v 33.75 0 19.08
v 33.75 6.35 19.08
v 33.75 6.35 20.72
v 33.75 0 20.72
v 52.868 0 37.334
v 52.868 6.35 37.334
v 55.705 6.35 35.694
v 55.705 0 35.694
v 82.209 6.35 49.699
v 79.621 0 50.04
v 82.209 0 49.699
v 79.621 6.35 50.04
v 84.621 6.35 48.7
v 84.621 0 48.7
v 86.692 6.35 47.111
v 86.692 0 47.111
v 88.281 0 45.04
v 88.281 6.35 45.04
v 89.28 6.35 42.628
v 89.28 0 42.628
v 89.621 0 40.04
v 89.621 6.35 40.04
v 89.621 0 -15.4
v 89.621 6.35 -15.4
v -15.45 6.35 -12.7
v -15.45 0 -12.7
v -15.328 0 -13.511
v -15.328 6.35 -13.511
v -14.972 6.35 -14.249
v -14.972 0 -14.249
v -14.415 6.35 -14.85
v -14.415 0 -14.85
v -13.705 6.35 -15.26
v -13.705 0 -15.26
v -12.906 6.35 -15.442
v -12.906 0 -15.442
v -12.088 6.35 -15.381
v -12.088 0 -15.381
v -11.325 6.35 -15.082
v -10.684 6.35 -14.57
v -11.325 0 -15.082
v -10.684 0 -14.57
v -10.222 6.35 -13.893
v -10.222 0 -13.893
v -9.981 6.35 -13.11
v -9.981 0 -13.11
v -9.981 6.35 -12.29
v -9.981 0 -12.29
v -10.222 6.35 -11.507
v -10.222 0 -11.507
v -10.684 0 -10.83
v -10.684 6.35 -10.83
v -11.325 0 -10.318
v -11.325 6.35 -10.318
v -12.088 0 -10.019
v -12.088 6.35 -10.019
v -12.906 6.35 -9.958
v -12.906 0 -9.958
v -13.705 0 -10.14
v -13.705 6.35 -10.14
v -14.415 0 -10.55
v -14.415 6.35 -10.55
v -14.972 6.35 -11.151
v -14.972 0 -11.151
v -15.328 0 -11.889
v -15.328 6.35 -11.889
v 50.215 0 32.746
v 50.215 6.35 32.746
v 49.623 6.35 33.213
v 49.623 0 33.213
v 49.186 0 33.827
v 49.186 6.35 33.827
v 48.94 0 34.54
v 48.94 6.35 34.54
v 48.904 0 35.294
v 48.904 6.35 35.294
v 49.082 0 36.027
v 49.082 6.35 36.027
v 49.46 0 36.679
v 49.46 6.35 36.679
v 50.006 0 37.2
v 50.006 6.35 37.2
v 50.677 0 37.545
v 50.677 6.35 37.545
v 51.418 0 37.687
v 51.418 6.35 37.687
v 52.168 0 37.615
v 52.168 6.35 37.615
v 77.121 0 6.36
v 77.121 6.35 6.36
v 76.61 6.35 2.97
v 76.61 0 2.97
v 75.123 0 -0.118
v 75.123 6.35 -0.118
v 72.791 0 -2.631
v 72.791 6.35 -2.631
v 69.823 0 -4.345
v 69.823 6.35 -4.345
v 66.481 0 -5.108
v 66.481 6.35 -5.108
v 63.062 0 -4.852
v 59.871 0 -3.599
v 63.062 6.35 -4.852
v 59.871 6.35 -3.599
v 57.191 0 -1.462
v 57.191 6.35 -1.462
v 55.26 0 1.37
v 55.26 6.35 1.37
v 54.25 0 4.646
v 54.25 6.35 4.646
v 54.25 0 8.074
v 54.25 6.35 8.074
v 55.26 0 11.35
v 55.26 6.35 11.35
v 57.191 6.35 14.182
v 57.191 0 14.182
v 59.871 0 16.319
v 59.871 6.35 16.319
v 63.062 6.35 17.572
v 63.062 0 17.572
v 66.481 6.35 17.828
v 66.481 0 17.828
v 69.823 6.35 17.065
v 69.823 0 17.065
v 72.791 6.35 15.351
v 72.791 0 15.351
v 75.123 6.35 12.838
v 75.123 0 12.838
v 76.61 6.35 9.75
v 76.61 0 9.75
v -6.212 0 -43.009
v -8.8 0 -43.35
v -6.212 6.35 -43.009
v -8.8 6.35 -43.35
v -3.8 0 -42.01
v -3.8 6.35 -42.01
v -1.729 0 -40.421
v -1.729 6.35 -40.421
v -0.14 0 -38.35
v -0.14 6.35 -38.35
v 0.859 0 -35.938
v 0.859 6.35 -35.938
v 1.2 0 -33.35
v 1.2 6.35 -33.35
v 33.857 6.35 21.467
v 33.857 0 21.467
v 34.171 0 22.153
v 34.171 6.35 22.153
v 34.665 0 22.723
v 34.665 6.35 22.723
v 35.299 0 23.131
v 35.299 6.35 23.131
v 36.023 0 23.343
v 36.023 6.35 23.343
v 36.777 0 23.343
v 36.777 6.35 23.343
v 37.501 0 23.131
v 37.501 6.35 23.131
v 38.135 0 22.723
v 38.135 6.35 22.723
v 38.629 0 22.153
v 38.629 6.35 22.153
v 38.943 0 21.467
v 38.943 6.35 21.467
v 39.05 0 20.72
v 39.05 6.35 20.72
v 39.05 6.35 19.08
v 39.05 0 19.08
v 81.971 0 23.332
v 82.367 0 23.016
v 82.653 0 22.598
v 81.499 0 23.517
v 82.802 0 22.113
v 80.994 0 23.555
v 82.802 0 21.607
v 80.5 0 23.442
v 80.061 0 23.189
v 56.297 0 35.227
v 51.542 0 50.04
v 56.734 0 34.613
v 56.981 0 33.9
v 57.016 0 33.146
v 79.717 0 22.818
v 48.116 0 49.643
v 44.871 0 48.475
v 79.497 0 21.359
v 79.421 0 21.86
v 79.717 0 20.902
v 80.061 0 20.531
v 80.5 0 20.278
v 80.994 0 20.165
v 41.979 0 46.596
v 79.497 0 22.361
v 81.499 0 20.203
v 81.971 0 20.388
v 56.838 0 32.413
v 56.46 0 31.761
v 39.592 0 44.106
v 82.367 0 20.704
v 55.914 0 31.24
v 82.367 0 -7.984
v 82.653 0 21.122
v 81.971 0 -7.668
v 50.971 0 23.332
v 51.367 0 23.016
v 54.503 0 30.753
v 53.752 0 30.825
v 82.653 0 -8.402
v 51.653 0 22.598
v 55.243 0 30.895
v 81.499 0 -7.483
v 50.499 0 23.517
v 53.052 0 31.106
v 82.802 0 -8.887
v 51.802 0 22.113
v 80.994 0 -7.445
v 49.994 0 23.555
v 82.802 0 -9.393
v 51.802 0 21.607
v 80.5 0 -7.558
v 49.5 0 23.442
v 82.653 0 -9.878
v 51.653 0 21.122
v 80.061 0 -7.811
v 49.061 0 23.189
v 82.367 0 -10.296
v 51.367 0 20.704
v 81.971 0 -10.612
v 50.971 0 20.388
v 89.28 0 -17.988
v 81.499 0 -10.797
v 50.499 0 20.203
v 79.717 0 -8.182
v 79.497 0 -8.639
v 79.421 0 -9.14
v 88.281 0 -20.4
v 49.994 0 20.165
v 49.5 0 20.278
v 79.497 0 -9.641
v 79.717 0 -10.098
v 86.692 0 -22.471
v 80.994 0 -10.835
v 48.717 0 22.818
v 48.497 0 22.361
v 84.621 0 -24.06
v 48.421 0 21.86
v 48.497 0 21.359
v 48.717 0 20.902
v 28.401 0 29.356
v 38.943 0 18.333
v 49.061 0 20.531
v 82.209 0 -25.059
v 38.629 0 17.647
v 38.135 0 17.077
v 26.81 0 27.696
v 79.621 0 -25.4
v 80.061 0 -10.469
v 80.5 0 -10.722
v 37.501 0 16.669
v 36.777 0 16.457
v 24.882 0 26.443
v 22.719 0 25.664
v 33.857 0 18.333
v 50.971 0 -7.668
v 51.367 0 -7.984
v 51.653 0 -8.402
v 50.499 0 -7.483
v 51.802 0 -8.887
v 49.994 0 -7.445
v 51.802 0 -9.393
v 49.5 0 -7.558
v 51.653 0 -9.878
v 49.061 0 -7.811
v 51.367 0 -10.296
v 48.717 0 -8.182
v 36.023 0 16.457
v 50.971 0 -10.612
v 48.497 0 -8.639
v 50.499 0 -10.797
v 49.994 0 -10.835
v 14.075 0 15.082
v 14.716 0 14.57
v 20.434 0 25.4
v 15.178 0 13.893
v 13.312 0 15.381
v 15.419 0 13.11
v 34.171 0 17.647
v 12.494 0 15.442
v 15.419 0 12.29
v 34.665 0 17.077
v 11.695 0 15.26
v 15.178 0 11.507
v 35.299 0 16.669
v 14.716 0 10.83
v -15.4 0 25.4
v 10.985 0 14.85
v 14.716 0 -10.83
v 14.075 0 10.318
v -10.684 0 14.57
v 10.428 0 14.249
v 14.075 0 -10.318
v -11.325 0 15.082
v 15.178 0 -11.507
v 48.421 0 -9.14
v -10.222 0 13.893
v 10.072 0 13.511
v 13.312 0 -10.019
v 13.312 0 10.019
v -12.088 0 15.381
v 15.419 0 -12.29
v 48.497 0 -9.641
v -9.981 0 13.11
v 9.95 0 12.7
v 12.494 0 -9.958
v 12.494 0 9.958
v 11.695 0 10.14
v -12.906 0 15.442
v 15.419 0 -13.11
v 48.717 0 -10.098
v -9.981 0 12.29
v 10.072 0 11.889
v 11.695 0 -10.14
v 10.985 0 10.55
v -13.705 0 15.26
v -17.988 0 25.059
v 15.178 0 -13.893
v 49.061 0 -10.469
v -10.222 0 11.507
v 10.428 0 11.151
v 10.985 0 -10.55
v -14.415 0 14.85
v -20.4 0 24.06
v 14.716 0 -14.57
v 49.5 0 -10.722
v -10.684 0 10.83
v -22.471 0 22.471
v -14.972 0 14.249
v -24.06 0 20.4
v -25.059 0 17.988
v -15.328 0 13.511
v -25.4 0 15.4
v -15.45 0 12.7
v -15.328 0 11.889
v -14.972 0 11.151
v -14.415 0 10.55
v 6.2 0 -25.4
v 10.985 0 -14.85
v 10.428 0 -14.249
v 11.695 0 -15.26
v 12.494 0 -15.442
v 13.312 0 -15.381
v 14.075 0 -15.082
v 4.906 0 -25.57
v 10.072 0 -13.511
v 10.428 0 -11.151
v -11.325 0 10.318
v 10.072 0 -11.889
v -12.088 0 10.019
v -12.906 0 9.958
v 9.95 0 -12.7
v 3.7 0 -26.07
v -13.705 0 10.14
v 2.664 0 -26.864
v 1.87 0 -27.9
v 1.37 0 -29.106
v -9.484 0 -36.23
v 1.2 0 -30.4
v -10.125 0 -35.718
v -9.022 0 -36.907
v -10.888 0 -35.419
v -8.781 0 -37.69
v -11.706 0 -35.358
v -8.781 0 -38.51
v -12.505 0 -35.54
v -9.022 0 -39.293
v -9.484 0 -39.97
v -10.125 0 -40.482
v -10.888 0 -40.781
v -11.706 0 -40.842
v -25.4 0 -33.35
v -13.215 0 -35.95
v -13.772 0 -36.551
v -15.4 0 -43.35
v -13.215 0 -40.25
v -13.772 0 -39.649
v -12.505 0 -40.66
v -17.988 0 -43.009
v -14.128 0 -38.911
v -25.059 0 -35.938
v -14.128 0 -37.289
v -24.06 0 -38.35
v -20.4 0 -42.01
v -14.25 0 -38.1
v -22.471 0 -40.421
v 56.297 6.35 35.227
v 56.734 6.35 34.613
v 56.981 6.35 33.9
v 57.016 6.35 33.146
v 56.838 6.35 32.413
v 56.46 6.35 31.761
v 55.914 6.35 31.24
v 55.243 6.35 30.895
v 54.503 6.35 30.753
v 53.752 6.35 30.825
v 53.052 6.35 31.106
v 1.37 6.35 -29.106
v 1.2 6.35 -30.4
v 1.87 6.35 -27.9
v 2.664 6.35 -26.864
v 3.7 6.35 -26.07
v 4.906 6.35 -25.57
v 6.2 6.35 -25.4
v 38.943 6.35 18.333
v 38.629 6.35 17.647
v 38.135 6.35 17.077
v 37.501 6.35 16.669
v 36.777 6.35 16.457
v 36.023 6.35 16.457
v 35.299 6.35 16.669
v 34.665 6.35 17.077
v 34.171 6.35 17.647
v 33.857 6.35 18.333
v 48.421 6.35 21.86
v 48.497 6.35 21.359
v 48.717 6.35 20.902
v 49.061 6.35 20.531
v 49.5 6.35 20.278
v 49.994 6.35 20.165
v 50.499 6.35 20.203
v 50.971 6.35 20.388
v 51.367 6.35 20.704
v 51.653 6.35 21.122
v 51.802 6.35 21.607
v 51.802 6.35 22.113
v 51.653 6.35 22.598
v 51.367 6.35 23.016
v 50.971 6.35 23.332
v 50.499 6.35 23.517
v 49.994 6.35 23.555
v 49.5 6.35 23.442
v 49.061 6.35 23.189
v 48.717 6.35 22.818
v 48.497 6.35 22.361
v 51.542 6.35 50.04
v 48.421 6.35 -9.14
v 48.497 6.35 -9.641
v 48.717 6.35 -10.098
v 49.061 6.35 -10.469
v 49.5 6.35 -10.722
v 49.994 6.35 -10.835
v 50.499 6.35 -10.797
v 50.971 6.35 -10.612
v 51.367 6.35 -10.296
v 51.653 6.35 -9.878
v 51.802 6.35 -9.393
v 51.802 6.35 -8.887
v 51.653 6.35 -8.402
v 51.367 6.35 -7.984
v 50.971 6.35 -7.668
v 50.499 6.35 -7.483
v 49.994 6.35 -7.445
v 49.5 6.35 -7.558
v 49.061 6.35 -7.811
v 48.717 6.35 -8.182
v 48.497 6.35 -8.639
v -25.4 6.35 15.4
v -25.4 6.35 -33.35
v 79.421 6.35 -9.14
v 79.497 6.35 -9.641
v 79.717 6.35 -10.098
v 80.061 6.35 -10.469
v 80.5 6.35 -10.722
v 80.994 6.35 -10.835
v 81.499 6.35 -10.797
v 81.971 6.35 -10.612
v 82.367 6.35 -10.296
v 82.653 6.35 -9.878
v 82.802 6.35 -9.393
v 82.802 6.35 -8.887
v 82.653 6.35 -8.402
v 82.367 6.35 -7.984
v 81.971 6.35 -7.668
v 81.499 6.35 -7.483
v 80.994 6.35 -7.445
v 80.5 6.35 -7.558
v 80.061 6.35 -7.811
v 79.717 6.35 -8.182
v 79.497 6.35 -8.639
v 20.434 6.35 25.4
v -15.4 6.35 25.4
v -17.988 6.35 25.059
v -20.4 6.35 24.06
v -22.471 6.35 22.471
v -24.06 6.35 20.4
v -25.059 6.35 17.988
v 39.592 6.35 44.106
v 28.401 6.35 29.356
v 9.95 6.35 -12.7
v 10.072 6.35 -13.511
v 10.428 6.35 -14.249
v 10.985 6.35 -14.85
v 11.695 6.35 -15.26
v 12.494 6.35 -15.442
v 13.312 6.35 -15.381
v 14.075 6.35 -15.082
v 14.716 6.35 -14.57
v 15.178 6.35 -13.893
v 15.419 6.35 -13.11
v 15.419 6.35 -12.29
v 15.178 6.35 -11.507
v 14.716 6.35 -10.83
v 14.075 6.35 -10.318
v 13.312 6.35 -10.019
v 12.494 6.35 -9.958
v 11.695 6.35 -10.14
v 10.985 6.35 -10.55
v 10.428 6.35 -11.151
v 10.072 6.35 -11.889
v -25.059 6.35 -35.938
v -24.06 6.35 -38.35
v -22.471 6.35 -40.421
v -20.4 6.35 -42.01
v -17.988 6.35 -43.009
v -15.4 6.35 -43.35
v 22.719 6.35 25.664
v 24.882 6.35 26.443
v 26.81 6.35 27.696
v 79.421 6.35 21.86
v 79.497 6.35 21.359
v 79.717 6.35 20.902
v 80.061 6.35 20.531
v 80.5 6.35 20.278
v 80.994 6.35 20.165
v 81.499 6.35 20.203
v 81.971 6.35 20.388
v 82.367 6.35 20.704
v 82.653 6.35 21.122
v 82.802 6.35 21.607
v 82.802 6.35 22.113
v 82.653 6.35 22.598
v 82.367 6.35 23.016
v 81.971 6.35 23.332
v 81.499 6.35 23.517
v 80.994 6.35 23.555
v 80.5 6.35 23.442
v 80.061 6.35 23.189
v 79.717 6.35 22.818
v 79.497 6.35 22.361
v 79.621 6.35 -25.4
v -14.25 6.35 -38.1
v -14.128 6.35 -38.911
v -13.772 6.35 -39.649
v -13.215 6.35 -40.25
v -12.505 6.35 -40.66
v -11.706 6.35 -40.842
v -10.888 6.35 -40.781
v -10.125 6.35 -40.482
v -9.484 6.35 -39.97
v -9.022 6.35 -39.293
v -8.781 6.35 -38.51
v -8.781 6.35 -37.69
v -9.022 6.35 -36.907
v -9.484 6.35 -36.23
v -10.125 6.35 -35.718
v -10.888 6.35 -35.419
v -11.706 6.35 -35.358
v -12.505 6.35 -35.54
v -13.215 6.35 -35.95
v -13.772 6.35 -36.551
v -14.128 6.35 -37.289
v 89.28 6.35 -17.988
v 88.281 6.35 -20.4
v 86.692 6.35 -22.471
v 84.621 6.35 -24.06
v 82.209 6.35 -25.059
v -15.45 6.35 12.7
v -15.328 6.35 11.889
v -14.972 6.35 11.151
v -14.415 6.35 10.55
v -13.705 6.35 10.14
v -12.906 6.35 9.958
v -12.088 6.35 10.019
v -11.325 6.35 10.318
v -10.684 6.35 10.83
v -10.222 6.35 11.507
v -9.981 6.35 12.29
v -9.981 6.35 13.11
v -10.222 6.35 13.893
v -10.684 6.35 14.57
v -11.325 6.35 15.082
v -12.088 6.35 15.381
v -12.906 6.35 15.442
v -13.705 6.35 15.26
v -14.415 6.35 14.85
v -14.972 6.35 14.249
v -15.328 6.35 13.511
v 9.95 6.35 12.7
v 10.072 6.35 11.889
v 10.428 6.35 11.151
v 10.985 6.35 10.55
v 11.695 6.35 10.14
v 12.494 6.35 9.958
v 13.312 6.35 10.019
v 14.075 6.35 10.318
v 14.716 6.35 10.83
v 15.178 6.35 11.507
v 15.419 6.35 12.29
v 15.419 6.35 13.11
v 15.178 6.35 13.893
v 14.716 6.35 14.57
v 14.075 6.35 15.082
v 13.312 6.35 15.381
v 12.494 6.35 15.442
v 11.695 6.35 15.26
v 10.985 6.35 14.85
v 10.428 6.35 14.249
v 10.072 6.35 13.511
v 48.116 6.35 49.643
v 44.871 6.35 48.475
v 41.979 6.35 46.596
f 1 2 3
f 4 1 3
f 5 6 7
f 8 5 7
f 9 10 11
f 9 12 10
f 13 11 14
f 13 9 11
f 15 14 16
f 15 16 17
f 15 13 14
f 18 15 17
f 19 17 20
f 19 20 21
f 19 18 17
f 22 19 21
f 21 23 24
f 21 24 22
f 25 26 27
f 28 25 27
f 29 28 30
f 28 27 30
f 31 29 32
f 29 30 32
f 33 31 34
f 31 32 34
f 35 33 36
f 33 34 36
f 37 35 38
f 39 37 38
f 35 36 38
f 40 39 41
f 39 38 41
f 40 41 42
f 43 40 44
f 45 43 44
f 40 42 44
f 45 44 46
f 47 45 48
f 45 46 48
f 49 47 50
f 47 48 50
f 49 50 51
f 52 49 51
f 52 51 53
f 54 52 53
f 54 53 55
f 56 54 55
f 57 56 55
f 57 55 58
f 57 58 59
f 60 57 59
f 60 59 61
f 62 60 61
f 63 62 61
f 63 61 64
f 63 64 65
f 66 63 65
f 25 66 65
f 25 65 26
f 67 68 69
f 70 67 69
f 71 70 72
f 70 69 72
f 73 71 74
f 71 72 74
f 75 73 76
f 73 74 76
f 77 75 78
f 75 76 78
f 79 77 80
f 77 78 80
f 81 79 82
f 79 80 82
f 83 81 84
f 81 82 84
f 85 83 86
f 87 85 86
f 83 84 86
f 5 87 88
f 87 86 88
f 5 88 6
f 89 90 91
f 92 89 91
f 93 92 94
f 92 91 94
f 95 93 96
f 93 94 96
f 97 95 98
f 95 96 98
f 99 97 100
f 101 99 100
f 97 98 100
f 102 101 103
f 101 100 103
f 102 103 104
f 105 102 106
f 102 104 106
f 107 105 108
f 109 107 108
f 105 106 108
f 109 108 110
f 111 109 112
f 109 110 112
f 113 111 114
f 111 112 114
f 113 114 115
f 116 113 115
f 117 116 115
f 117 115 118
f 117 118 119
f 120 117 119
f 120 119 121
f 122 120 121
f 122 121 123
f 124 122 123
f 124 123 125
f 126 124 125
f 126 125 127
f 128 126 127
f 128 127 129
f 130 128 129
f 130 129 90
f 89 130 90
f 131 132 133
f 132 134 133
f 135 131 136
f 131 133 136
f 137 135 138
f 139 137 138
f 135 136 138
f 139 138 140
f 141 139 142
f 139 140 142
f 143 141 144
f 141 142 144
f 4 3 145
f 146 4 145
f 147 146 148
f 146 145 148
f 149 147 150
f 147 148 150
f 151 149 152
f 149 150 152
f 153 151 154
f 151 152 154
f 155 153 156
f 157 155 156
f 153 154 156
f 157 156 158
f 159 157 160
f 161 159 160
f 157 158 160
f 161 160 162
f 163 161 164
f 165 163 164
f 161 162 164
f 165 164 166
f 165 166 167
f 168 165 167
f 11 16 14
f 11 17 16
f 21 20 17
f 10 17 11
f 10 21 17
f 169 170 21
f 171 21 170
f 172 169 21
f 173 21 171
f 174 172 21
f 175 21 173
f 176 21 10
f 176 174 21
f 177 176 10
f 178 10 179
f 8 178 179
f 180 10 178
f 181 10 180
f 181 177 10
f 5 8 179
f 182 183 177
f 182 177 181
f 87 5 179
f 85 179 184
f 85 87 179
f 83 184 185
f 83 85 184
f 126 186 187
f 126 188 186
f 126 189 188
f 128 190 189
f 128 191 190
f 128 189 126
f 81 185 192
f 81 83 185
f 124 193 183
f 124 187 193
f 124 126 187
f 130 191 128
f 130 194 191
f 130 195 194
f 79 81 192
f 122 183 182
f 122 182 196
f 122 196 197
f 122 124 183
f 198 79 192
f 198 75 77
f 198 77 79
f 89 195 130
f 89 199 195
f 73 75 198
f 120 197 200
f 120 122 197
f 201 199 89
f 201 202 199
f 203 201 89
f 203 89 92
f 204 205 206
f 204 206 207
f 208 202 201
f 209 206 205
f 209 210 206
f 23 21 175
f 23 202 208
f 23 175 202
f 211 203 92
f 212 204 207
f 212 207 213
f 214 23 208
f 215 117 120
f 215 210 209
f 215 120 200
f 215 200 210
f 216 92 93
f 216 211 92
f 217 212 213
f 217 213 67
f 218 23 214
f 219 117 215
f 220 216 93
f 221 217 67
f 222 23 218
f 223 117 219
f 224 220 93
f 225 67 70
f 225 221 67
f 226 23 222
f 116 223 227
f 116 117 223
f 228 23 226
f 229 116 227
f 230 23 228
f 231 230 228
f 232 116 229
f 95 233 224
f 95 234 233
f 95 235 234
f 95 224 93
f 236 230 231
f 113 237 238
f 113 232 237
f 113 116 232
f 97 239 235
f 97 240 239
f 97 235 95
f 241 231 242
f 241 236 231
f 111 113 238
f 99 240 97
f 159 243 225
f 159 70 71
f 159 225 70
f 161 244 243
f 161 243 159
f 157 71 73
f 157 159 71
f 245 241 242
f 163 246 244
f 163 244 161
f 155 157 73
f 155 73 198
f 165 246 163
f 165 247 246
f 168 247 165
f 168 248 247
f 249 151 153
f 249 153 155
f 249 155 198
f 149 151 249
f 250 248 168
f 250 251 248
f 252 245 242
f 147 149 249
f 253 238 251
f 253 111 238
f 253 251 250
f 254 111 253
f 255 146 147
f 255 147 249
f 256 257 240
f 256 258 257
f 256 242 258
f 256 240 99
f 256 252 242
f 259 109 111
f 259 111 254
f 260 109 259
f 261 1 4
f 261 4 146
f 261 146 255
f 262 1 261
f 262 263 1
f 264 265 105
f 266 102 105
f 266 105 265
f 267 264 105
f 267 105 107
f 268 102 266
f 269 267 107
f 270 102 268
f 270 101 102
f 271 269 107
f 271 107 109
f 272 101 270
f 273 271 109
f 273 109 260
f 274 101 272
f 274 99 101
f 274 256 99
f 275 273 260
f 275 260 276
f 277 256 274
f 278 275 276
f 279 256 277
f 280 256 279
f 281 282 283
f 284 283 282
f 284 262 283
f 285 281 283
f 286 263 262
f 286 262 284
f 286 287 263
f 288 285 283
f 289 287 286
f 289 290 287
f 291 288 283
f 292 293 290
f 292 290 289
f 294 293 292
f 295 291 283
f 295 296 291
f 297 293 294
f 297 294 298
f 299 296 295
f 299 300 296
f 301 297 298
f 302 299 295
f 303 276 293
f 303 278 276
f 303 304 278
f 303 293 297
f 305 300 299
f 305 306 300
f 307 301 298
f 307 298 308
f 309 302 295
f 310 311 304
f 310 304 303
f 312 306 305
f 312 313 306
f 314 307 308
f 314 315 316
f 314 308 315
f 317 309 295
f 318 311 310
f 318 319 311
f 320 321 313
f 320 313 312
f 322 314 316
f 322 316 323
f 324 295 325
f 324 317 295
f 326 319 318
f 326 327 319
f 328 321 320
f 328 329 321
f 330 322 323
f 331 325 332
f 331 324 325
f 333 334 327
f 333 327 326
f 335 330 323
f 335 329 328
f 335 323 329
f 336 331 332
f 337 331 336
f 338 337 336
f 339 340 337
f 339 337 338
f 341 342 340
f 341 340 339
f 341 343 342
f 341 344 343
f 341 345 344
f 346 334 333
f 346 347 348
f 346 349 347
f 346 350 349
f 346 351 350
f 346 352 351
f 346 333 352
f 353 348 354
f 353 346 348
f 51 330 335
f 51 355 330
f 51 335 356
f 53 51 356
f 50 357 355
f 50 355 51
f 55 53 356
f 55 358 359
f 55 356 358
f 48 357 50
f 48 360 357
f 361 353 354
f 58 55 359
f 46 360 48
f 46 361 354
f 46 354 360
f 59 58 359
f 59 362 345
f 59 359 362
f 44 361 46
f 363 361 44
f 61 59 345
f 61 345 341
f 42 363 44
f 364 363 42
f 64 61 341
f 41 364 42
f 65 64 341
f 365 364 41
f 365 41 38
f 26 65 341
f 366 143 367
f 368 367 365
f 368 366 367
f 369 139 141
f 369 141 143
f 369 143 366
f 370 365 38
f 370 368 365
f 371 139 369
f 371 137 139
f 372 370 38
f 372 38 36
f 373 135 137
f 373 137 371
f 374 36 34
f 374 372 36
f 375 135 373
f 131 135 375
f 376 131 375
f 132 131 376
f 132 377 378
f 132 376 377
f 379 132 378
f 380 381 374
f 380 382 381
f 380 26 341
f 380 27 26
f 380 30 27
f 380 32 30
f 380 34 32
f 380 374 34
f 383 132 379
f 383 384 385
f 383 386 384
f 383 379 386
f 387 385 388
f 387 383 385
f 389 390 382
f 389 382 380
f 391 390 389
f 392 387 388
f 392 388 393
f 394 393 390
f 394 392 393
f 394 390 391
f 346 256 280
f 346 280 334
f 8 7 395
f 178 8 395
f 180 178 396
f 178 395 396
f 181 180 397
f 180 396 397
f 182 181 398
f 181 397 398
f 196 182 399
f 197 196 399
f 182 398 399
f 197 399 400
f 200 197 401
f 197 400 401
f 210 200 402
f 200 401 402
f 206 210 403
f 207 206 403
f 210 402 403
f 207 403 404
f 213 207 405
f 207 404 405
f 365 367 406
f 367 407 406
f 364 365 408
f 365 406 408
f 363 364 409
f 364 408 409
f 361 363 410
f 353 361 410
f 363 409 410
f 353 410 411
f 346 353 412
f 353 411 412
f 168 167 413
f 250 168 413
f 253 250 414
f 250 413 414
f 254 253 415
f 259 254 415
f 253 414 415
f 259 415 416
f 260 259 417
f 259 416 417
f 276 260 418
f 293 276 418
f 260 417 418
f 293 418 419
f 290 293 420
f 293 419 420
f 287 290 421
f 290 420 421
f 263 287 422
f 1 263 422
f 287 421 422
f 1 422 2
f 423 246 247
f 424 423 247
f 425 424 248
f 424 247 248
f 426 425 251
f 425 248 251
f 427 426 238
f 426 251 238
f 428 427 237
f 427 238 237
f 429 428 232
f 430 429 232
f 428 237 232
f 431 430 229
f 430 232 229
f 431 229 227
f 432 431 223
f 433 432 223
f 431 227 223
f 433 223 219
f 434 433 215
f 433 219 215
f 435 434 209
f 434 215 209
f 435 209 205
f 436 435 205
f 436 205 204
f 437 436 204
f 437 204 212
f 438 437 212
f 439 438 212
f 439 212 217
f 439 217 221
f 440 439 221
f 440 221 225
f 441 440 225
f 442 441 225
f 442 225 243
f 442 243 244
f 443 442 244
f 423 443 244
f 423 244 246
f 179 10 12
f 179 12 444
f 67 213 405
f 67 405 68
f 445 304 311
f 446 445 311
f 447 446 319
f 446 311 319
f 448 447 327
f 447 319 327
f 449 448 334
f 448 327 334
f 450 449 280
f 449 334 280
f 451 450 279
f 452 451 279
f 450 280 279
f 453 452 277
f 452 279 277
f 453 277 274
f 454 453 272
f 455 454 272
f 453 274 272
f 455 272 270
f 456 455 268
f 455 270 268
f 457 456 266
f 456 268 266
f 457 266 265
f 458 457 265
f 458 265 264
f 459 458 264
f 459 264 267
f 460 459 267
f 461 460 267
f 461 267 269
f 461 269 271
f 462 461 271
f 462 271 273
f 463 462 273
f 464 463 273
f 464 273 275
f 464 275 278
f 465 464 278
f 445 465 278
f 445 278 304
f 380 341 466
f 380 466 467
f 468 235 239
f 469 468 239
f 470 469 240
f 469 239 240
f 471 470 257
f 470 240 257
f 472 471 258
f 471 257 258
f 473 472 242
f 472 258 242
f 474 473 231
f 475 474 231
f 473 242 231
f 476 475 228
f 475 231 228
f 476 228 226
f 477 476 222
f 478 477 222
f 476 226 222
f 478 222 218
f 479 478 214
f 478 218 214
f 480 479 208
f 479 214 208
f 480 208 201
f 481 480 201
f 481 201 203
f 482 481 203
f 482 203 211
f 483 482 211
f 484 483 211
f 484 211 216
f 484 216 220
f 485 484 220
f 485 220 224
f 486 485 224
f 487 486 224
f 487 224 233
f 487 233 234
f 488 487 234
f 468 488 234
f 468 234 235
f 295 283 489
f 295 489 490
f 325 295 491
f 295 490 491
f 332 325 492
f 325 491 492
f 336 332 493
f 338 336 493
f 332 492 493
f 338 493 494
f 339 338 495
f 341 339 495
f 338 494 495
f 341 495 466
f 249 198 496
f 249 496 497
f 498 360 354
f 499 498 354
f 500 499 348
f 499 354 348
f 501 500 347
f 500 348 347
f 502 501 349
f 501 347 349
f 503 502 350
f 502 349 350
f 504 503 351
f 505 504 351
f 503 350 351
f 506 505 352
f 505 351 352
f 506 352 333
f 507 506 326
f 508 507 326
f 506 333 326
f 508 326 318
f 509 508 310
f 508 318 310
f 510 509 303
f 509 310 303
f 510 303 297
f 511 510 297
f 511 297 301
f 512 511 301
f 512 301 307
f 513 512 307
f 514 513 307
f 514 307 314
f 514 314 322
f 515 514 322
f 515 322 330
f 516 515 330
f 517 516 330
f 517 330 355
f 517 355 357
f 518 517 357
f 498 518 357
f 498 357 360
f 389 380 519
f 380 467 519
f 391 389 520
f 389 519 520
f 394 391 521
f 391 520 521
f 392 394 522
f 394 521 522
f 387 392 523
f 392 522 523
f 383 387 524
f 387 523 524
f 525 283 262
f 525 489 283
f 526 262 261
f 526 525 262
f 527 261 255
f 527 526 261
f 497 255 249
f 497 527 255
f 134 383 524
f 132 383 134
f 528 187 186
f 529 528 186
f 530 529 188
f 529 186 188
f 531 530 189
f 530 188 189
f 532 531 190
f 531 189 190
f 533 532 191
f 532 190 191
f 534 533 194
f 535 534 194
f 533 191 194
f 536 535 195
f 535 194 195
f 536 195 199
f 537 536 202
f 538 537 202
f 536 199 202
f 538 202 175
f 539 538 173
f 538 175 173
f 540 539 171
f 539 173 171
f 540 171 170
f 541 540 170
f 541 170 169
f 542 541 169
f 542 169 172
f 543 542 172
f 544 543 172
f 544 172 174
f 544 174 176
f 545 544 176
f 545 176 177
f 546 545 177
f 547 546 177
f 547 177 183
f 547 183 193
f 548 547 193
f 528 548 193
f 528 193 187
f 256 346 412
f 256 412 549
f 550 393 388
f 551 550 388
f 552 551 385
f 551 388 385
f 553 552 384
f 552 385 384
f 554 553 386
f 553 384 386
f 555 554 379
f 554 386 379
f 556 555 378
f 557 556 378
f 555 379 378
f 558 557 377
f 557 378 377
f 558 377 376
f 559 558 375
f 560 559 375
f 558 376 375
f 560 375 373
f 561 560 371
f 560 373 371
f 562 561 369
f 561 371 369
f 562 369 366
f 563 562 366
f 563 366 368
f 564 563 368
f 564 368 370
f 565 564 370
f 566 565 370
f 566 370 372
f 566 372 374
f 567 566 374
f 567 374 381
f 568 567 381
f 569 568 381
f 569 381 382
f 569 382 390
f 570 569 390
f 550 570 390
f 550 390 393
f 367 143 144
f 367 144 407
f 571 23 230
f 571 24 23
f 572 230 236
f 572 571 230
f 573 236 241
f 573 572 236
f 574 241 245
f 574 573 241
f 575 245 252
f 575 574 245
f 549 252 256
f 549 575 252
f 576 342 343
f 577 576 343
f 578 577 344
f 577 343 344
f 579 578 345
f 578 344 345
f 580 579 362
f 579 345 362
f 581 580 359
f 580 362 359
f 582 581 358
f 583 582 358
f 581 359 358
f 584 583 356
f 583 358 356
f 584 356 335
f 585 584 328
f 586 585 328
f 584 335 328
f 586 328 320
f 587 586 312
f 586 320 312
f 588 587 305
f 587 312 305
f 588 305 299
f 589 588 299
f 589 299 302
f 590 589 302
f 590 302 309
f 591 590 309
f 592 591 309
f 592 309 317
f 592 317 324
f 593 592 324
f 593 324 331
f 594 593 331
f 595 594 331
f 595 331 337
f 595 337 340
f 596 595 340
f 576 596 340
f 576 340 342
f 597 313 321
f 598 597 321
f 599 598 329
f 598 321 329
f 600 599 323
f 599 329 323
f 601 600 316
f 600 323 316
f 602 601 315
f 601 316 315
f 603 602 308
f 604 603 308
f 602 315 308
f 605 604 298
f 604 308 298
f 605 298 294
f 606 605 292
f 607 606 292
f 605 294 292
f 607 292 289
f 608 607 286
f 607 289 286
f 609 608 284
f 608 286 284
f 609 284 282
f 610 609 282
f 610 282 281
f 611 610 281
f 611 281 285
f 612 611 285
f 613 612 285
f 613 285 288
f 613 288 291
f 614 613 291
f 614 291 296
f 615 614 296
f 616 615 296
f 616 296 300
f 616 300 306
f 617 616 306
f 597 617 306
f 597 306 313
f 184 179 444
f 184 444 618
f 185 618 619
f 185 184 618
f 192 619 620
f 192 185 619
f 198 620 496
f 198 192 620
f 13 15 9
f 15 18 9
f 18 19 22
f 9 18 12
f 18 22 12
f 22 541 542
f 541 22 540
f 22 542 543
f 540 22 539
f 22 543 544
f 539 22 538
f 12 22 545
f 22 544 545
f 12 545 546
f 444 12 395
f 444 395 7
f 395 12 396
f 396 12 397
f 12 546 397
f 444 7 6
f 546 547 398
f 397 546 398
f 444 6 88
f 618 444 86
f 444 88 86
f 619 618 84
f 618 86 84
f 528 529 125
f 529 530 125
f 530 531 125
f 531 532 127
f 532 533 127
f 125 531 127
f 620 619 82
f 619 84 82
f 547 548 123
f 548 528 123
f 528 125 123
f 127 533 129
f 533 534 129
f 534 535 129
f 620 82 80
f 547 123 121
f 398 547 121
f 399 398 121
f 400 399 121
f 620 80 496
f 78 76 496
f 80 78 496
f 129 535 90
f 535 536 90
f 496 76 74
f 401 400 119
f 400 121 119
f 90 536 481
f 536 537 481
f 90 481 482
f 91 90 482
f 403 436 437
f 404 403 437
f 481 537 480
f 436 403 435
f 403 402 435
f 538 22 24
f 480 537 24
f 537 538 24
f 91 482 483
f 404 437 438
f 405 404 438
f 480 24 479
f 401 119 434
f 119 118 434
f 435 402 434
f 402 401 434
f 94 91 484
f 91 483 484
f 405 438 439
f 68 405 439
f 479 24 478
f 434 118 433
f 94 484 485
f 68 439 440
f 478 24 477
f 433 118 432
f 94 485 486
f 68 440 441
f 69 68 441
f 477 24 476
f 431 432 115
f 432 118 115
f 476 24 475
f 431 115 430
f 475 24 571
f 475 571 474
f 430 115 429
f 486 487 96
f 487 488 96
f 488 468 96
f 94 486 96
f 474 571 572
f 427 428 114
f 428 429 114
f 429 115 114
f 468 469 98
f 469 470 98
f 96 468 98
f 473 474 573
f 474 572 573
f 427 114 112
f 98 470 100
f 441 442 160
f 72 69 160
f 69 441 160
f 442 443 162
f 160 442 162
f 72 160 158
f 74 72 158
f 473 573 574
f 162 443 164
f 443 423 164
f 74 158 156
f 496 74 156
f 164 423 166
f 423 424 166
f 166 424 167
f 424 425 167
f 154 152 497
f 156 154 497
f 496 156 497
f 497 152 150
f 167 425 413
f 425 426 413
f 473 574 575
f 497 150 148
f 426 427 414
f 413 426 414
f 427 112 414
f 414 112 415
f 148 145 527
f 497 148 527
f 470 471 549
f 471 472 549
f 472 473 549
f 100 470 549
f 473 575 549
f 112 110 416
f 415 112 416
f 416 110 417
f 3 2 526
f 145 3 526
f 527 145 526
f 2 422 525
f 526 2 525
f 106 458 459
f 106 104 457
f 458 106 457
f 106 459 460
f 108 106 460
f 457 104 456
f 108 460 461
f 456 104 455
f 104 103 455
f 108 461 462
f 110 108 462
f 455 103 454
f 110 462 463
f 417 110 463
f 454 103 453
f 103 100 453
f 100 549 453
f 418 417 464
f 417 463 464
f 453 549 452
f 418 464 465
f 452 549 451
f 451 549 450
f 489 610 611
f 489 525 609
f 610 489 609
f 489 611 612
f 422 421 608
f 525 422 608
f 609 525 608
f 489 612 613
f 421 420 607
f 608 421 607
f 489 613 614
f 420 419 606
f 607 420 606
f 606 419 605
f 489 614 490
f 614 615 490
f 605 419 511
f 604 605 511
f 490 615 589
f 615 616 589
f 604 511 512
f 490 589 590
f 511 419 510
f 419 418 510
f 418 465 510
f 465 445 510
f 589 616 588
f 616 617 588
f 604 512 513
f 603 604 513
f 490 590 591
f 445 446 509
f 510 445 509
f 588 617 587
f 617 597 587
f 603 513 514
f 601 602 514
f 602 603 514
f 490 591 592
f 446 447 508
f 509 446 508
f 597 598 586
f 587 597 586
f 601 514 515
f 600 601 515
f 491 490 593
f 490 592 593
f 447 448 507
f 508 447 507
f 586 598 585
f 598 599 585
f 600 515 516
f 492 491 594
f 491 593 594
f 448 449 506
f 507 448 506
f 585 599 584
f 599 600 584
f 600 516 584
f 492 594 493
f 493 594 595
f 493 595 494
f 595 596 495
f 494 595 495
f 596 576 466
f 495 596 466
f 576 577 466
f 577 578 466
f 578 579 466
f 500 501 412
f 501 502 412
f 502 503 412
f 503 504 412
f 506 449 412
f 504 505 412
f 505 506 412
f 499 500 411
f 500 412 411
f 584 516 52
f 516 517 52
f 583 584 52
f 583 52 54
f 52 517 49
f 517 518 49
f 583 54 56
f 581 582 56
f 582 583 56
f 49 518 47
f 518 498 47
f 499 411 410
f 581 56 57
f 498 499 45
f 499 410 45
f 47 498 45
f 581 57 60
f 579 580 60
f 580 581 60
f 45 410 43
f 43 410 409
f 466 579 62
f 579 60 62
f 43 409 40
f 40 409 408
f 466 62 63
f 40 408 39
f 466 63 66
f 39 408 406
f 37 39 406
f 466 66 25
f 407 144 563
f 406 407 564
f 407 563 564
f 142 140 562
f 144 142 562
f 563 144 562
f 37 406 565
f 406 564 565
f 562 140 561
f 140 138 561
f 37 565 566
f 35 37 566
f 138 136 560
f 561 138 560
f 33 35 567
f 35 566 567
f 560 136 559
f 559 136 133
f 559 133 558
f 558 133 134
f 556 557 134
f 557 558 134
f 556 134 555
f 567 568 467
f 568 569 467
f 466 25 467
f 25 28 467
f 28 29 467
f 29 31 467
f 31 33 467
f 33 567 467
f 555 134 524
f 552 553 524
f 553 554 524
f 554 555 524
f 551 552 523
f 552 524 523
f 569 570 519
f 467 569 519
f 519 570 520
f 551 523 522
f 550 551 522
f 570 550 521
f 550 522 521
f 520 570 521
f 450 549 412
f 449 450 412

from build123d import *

# Parameters (mm, degrees)
BOSS_EXTRUDE1_DEPTH  = 6.35
M5_CLEARANCE_HOLE1_D = 5.5
CUT_EXTRUDE2_DEPTH   = 7.35
FILLET1_R            = 10
M3_CLEARANCE_HOLE1_D = 3.4
SKETCH10_R           = 11.5
CUT_EXTRUDE3_DEPTH   = 7.35
FILLET2_R            = 5


with BuildPart() as part:
    # Sketch1 → Boss-Extrude1 (new body)
    with BuildSketch(Plane(origin=(0, 0, 0), x_dir=(1, 0, 0), z_dir=(0, 1, 0))):
        with BuildLine():
            Line((25.4, -25.4), (-25.4, -25.4))
            Line((-25.4, -25.4), (-25.4, 25.4))
            Line((-25.4, 25.4), (-25.4, 43.35))
            Line((-25.4, 43.35), (1.2, 43.35))
            Line((1.2, 43.35), (1.2, 25.4))
            Line((1.2, 25.4), (25.4, 25.4))
            Line((25.4, 25.4), (89.621209859, 25.4))
            Line((89.621209859, 25.4), (89.621209859, -50.04))
            Line((89.621209859, -50.04), (51.541941751, -50.04))
            ThreePointArc((51.541941751, -50.04), (44.870841587, -48.474895705), (39.591870426, -44.10618968))
            Line((39.591870426, -44.10618968), (25.4, -25.4))
        make_face()
    extrude(amount=BOSS_EXTRUDE1_DEPTH)

    # M5 Clearance Hole1 (through all)
    with Locations(Plane(origin=(0, 6.35, 0), x_dir=(1, 0, 0), z_dir=(0, 1, 0))):
        with Locations((-12.7, 12.7), (12.7, 12.7), (12.7, -12.7), (-12.7, -12.7), (-11.5, 38.1)):
            Hole(M5_CLEARANCE_HOLE1_D / 2)

    # Sketch7 → Cut-Extrude2 (cut, through all)
    with BuildSketch(Plane(origin=(0, 6.35, 0), x_dir=(1, 0, 0), z_dir=(0, 1, 0))):
        with BuildLine():
            Line((53.051764766, -31.105892862), (50.215452987, -32.745892862))
            ThreePointArc((50.215452987, -32.745892862), (49.247834614, -36.366488764), (52.868430515, -37.334107138))
            Line((52.868430515, -37.334107138), (55.704742294, -35.694107138))
            ThreePointArc((55.704742294, -35.694107138), (56.672360668, -32.073511236), (53.051764766, -31.105892862))
        make_face()
        with BuildLine():
            Line((33.75, -19.08), (33.75, -20.72))
            ThreePointArc((33.75, -20.72), (36.4, -23.37), (39.05, -20.72))
            Line((39.05, -20.72), (39.05, -19.08))
            ThreePointArc((39.05, -19.08), (36.4, -16.43), (33.75, -19.08))
        make_face()
    extrude(amount=-CUT_EXTRUDE2_DEPTH, mode=Mode.SUBTRACT)

    # Fillet1
    fillet1_edges = [part.edges().sort_by_distance(p)[0] for p in [
        (-25.4, 3.175, -43.35),
        (1.2, 3.175, -43.35),
        (89.621209859, 3.175, -25.4),
        (89.621209859, 3.175, 50.04),
        (25.4, 3.175, 25.4),
        (-25.4, 3.175, 25.4),
    ]]
    fillet(fillet1_edges, radius=FILLET1_R)

    # M3 Clearance Hole1 (through all)
    with Locations(Plane(origin=(0, 6.35, 0), x_dir=(1, 0, 0), z_dir=(0, 1, 0))):
        with Locations((50.121209859, 9.14), (81.121209859, 9.14), (81.121209859, -21.86), (50.121209859, -21.86)):
            Hole(M3_CLEARANCE_HOLE1_D / 2)

    # Sketch10 → Cut-Extrude3 (cut, through all)
    with BuildSketch(Plane(origin=(0, 6.35, 0), x_dir=(1, 0, 0), z_dir=(0, 1, 0))):
        with Locations((65.621209859, -6.36)):
            Circle(SKETCH10_R)
    extrude(amount=-CUT_EXTRUDE3_DEPTH, mode=Mode.SUBTRACT)

    # Fillet2
    fillet2_edges = [part.edges().sort_by_distance(p)[0] for p in [
        (1.2, 3.175, -25.4),
    ]]
    fillet(fillet2_edges, radius=FILLET2_R)


solid = part.part
